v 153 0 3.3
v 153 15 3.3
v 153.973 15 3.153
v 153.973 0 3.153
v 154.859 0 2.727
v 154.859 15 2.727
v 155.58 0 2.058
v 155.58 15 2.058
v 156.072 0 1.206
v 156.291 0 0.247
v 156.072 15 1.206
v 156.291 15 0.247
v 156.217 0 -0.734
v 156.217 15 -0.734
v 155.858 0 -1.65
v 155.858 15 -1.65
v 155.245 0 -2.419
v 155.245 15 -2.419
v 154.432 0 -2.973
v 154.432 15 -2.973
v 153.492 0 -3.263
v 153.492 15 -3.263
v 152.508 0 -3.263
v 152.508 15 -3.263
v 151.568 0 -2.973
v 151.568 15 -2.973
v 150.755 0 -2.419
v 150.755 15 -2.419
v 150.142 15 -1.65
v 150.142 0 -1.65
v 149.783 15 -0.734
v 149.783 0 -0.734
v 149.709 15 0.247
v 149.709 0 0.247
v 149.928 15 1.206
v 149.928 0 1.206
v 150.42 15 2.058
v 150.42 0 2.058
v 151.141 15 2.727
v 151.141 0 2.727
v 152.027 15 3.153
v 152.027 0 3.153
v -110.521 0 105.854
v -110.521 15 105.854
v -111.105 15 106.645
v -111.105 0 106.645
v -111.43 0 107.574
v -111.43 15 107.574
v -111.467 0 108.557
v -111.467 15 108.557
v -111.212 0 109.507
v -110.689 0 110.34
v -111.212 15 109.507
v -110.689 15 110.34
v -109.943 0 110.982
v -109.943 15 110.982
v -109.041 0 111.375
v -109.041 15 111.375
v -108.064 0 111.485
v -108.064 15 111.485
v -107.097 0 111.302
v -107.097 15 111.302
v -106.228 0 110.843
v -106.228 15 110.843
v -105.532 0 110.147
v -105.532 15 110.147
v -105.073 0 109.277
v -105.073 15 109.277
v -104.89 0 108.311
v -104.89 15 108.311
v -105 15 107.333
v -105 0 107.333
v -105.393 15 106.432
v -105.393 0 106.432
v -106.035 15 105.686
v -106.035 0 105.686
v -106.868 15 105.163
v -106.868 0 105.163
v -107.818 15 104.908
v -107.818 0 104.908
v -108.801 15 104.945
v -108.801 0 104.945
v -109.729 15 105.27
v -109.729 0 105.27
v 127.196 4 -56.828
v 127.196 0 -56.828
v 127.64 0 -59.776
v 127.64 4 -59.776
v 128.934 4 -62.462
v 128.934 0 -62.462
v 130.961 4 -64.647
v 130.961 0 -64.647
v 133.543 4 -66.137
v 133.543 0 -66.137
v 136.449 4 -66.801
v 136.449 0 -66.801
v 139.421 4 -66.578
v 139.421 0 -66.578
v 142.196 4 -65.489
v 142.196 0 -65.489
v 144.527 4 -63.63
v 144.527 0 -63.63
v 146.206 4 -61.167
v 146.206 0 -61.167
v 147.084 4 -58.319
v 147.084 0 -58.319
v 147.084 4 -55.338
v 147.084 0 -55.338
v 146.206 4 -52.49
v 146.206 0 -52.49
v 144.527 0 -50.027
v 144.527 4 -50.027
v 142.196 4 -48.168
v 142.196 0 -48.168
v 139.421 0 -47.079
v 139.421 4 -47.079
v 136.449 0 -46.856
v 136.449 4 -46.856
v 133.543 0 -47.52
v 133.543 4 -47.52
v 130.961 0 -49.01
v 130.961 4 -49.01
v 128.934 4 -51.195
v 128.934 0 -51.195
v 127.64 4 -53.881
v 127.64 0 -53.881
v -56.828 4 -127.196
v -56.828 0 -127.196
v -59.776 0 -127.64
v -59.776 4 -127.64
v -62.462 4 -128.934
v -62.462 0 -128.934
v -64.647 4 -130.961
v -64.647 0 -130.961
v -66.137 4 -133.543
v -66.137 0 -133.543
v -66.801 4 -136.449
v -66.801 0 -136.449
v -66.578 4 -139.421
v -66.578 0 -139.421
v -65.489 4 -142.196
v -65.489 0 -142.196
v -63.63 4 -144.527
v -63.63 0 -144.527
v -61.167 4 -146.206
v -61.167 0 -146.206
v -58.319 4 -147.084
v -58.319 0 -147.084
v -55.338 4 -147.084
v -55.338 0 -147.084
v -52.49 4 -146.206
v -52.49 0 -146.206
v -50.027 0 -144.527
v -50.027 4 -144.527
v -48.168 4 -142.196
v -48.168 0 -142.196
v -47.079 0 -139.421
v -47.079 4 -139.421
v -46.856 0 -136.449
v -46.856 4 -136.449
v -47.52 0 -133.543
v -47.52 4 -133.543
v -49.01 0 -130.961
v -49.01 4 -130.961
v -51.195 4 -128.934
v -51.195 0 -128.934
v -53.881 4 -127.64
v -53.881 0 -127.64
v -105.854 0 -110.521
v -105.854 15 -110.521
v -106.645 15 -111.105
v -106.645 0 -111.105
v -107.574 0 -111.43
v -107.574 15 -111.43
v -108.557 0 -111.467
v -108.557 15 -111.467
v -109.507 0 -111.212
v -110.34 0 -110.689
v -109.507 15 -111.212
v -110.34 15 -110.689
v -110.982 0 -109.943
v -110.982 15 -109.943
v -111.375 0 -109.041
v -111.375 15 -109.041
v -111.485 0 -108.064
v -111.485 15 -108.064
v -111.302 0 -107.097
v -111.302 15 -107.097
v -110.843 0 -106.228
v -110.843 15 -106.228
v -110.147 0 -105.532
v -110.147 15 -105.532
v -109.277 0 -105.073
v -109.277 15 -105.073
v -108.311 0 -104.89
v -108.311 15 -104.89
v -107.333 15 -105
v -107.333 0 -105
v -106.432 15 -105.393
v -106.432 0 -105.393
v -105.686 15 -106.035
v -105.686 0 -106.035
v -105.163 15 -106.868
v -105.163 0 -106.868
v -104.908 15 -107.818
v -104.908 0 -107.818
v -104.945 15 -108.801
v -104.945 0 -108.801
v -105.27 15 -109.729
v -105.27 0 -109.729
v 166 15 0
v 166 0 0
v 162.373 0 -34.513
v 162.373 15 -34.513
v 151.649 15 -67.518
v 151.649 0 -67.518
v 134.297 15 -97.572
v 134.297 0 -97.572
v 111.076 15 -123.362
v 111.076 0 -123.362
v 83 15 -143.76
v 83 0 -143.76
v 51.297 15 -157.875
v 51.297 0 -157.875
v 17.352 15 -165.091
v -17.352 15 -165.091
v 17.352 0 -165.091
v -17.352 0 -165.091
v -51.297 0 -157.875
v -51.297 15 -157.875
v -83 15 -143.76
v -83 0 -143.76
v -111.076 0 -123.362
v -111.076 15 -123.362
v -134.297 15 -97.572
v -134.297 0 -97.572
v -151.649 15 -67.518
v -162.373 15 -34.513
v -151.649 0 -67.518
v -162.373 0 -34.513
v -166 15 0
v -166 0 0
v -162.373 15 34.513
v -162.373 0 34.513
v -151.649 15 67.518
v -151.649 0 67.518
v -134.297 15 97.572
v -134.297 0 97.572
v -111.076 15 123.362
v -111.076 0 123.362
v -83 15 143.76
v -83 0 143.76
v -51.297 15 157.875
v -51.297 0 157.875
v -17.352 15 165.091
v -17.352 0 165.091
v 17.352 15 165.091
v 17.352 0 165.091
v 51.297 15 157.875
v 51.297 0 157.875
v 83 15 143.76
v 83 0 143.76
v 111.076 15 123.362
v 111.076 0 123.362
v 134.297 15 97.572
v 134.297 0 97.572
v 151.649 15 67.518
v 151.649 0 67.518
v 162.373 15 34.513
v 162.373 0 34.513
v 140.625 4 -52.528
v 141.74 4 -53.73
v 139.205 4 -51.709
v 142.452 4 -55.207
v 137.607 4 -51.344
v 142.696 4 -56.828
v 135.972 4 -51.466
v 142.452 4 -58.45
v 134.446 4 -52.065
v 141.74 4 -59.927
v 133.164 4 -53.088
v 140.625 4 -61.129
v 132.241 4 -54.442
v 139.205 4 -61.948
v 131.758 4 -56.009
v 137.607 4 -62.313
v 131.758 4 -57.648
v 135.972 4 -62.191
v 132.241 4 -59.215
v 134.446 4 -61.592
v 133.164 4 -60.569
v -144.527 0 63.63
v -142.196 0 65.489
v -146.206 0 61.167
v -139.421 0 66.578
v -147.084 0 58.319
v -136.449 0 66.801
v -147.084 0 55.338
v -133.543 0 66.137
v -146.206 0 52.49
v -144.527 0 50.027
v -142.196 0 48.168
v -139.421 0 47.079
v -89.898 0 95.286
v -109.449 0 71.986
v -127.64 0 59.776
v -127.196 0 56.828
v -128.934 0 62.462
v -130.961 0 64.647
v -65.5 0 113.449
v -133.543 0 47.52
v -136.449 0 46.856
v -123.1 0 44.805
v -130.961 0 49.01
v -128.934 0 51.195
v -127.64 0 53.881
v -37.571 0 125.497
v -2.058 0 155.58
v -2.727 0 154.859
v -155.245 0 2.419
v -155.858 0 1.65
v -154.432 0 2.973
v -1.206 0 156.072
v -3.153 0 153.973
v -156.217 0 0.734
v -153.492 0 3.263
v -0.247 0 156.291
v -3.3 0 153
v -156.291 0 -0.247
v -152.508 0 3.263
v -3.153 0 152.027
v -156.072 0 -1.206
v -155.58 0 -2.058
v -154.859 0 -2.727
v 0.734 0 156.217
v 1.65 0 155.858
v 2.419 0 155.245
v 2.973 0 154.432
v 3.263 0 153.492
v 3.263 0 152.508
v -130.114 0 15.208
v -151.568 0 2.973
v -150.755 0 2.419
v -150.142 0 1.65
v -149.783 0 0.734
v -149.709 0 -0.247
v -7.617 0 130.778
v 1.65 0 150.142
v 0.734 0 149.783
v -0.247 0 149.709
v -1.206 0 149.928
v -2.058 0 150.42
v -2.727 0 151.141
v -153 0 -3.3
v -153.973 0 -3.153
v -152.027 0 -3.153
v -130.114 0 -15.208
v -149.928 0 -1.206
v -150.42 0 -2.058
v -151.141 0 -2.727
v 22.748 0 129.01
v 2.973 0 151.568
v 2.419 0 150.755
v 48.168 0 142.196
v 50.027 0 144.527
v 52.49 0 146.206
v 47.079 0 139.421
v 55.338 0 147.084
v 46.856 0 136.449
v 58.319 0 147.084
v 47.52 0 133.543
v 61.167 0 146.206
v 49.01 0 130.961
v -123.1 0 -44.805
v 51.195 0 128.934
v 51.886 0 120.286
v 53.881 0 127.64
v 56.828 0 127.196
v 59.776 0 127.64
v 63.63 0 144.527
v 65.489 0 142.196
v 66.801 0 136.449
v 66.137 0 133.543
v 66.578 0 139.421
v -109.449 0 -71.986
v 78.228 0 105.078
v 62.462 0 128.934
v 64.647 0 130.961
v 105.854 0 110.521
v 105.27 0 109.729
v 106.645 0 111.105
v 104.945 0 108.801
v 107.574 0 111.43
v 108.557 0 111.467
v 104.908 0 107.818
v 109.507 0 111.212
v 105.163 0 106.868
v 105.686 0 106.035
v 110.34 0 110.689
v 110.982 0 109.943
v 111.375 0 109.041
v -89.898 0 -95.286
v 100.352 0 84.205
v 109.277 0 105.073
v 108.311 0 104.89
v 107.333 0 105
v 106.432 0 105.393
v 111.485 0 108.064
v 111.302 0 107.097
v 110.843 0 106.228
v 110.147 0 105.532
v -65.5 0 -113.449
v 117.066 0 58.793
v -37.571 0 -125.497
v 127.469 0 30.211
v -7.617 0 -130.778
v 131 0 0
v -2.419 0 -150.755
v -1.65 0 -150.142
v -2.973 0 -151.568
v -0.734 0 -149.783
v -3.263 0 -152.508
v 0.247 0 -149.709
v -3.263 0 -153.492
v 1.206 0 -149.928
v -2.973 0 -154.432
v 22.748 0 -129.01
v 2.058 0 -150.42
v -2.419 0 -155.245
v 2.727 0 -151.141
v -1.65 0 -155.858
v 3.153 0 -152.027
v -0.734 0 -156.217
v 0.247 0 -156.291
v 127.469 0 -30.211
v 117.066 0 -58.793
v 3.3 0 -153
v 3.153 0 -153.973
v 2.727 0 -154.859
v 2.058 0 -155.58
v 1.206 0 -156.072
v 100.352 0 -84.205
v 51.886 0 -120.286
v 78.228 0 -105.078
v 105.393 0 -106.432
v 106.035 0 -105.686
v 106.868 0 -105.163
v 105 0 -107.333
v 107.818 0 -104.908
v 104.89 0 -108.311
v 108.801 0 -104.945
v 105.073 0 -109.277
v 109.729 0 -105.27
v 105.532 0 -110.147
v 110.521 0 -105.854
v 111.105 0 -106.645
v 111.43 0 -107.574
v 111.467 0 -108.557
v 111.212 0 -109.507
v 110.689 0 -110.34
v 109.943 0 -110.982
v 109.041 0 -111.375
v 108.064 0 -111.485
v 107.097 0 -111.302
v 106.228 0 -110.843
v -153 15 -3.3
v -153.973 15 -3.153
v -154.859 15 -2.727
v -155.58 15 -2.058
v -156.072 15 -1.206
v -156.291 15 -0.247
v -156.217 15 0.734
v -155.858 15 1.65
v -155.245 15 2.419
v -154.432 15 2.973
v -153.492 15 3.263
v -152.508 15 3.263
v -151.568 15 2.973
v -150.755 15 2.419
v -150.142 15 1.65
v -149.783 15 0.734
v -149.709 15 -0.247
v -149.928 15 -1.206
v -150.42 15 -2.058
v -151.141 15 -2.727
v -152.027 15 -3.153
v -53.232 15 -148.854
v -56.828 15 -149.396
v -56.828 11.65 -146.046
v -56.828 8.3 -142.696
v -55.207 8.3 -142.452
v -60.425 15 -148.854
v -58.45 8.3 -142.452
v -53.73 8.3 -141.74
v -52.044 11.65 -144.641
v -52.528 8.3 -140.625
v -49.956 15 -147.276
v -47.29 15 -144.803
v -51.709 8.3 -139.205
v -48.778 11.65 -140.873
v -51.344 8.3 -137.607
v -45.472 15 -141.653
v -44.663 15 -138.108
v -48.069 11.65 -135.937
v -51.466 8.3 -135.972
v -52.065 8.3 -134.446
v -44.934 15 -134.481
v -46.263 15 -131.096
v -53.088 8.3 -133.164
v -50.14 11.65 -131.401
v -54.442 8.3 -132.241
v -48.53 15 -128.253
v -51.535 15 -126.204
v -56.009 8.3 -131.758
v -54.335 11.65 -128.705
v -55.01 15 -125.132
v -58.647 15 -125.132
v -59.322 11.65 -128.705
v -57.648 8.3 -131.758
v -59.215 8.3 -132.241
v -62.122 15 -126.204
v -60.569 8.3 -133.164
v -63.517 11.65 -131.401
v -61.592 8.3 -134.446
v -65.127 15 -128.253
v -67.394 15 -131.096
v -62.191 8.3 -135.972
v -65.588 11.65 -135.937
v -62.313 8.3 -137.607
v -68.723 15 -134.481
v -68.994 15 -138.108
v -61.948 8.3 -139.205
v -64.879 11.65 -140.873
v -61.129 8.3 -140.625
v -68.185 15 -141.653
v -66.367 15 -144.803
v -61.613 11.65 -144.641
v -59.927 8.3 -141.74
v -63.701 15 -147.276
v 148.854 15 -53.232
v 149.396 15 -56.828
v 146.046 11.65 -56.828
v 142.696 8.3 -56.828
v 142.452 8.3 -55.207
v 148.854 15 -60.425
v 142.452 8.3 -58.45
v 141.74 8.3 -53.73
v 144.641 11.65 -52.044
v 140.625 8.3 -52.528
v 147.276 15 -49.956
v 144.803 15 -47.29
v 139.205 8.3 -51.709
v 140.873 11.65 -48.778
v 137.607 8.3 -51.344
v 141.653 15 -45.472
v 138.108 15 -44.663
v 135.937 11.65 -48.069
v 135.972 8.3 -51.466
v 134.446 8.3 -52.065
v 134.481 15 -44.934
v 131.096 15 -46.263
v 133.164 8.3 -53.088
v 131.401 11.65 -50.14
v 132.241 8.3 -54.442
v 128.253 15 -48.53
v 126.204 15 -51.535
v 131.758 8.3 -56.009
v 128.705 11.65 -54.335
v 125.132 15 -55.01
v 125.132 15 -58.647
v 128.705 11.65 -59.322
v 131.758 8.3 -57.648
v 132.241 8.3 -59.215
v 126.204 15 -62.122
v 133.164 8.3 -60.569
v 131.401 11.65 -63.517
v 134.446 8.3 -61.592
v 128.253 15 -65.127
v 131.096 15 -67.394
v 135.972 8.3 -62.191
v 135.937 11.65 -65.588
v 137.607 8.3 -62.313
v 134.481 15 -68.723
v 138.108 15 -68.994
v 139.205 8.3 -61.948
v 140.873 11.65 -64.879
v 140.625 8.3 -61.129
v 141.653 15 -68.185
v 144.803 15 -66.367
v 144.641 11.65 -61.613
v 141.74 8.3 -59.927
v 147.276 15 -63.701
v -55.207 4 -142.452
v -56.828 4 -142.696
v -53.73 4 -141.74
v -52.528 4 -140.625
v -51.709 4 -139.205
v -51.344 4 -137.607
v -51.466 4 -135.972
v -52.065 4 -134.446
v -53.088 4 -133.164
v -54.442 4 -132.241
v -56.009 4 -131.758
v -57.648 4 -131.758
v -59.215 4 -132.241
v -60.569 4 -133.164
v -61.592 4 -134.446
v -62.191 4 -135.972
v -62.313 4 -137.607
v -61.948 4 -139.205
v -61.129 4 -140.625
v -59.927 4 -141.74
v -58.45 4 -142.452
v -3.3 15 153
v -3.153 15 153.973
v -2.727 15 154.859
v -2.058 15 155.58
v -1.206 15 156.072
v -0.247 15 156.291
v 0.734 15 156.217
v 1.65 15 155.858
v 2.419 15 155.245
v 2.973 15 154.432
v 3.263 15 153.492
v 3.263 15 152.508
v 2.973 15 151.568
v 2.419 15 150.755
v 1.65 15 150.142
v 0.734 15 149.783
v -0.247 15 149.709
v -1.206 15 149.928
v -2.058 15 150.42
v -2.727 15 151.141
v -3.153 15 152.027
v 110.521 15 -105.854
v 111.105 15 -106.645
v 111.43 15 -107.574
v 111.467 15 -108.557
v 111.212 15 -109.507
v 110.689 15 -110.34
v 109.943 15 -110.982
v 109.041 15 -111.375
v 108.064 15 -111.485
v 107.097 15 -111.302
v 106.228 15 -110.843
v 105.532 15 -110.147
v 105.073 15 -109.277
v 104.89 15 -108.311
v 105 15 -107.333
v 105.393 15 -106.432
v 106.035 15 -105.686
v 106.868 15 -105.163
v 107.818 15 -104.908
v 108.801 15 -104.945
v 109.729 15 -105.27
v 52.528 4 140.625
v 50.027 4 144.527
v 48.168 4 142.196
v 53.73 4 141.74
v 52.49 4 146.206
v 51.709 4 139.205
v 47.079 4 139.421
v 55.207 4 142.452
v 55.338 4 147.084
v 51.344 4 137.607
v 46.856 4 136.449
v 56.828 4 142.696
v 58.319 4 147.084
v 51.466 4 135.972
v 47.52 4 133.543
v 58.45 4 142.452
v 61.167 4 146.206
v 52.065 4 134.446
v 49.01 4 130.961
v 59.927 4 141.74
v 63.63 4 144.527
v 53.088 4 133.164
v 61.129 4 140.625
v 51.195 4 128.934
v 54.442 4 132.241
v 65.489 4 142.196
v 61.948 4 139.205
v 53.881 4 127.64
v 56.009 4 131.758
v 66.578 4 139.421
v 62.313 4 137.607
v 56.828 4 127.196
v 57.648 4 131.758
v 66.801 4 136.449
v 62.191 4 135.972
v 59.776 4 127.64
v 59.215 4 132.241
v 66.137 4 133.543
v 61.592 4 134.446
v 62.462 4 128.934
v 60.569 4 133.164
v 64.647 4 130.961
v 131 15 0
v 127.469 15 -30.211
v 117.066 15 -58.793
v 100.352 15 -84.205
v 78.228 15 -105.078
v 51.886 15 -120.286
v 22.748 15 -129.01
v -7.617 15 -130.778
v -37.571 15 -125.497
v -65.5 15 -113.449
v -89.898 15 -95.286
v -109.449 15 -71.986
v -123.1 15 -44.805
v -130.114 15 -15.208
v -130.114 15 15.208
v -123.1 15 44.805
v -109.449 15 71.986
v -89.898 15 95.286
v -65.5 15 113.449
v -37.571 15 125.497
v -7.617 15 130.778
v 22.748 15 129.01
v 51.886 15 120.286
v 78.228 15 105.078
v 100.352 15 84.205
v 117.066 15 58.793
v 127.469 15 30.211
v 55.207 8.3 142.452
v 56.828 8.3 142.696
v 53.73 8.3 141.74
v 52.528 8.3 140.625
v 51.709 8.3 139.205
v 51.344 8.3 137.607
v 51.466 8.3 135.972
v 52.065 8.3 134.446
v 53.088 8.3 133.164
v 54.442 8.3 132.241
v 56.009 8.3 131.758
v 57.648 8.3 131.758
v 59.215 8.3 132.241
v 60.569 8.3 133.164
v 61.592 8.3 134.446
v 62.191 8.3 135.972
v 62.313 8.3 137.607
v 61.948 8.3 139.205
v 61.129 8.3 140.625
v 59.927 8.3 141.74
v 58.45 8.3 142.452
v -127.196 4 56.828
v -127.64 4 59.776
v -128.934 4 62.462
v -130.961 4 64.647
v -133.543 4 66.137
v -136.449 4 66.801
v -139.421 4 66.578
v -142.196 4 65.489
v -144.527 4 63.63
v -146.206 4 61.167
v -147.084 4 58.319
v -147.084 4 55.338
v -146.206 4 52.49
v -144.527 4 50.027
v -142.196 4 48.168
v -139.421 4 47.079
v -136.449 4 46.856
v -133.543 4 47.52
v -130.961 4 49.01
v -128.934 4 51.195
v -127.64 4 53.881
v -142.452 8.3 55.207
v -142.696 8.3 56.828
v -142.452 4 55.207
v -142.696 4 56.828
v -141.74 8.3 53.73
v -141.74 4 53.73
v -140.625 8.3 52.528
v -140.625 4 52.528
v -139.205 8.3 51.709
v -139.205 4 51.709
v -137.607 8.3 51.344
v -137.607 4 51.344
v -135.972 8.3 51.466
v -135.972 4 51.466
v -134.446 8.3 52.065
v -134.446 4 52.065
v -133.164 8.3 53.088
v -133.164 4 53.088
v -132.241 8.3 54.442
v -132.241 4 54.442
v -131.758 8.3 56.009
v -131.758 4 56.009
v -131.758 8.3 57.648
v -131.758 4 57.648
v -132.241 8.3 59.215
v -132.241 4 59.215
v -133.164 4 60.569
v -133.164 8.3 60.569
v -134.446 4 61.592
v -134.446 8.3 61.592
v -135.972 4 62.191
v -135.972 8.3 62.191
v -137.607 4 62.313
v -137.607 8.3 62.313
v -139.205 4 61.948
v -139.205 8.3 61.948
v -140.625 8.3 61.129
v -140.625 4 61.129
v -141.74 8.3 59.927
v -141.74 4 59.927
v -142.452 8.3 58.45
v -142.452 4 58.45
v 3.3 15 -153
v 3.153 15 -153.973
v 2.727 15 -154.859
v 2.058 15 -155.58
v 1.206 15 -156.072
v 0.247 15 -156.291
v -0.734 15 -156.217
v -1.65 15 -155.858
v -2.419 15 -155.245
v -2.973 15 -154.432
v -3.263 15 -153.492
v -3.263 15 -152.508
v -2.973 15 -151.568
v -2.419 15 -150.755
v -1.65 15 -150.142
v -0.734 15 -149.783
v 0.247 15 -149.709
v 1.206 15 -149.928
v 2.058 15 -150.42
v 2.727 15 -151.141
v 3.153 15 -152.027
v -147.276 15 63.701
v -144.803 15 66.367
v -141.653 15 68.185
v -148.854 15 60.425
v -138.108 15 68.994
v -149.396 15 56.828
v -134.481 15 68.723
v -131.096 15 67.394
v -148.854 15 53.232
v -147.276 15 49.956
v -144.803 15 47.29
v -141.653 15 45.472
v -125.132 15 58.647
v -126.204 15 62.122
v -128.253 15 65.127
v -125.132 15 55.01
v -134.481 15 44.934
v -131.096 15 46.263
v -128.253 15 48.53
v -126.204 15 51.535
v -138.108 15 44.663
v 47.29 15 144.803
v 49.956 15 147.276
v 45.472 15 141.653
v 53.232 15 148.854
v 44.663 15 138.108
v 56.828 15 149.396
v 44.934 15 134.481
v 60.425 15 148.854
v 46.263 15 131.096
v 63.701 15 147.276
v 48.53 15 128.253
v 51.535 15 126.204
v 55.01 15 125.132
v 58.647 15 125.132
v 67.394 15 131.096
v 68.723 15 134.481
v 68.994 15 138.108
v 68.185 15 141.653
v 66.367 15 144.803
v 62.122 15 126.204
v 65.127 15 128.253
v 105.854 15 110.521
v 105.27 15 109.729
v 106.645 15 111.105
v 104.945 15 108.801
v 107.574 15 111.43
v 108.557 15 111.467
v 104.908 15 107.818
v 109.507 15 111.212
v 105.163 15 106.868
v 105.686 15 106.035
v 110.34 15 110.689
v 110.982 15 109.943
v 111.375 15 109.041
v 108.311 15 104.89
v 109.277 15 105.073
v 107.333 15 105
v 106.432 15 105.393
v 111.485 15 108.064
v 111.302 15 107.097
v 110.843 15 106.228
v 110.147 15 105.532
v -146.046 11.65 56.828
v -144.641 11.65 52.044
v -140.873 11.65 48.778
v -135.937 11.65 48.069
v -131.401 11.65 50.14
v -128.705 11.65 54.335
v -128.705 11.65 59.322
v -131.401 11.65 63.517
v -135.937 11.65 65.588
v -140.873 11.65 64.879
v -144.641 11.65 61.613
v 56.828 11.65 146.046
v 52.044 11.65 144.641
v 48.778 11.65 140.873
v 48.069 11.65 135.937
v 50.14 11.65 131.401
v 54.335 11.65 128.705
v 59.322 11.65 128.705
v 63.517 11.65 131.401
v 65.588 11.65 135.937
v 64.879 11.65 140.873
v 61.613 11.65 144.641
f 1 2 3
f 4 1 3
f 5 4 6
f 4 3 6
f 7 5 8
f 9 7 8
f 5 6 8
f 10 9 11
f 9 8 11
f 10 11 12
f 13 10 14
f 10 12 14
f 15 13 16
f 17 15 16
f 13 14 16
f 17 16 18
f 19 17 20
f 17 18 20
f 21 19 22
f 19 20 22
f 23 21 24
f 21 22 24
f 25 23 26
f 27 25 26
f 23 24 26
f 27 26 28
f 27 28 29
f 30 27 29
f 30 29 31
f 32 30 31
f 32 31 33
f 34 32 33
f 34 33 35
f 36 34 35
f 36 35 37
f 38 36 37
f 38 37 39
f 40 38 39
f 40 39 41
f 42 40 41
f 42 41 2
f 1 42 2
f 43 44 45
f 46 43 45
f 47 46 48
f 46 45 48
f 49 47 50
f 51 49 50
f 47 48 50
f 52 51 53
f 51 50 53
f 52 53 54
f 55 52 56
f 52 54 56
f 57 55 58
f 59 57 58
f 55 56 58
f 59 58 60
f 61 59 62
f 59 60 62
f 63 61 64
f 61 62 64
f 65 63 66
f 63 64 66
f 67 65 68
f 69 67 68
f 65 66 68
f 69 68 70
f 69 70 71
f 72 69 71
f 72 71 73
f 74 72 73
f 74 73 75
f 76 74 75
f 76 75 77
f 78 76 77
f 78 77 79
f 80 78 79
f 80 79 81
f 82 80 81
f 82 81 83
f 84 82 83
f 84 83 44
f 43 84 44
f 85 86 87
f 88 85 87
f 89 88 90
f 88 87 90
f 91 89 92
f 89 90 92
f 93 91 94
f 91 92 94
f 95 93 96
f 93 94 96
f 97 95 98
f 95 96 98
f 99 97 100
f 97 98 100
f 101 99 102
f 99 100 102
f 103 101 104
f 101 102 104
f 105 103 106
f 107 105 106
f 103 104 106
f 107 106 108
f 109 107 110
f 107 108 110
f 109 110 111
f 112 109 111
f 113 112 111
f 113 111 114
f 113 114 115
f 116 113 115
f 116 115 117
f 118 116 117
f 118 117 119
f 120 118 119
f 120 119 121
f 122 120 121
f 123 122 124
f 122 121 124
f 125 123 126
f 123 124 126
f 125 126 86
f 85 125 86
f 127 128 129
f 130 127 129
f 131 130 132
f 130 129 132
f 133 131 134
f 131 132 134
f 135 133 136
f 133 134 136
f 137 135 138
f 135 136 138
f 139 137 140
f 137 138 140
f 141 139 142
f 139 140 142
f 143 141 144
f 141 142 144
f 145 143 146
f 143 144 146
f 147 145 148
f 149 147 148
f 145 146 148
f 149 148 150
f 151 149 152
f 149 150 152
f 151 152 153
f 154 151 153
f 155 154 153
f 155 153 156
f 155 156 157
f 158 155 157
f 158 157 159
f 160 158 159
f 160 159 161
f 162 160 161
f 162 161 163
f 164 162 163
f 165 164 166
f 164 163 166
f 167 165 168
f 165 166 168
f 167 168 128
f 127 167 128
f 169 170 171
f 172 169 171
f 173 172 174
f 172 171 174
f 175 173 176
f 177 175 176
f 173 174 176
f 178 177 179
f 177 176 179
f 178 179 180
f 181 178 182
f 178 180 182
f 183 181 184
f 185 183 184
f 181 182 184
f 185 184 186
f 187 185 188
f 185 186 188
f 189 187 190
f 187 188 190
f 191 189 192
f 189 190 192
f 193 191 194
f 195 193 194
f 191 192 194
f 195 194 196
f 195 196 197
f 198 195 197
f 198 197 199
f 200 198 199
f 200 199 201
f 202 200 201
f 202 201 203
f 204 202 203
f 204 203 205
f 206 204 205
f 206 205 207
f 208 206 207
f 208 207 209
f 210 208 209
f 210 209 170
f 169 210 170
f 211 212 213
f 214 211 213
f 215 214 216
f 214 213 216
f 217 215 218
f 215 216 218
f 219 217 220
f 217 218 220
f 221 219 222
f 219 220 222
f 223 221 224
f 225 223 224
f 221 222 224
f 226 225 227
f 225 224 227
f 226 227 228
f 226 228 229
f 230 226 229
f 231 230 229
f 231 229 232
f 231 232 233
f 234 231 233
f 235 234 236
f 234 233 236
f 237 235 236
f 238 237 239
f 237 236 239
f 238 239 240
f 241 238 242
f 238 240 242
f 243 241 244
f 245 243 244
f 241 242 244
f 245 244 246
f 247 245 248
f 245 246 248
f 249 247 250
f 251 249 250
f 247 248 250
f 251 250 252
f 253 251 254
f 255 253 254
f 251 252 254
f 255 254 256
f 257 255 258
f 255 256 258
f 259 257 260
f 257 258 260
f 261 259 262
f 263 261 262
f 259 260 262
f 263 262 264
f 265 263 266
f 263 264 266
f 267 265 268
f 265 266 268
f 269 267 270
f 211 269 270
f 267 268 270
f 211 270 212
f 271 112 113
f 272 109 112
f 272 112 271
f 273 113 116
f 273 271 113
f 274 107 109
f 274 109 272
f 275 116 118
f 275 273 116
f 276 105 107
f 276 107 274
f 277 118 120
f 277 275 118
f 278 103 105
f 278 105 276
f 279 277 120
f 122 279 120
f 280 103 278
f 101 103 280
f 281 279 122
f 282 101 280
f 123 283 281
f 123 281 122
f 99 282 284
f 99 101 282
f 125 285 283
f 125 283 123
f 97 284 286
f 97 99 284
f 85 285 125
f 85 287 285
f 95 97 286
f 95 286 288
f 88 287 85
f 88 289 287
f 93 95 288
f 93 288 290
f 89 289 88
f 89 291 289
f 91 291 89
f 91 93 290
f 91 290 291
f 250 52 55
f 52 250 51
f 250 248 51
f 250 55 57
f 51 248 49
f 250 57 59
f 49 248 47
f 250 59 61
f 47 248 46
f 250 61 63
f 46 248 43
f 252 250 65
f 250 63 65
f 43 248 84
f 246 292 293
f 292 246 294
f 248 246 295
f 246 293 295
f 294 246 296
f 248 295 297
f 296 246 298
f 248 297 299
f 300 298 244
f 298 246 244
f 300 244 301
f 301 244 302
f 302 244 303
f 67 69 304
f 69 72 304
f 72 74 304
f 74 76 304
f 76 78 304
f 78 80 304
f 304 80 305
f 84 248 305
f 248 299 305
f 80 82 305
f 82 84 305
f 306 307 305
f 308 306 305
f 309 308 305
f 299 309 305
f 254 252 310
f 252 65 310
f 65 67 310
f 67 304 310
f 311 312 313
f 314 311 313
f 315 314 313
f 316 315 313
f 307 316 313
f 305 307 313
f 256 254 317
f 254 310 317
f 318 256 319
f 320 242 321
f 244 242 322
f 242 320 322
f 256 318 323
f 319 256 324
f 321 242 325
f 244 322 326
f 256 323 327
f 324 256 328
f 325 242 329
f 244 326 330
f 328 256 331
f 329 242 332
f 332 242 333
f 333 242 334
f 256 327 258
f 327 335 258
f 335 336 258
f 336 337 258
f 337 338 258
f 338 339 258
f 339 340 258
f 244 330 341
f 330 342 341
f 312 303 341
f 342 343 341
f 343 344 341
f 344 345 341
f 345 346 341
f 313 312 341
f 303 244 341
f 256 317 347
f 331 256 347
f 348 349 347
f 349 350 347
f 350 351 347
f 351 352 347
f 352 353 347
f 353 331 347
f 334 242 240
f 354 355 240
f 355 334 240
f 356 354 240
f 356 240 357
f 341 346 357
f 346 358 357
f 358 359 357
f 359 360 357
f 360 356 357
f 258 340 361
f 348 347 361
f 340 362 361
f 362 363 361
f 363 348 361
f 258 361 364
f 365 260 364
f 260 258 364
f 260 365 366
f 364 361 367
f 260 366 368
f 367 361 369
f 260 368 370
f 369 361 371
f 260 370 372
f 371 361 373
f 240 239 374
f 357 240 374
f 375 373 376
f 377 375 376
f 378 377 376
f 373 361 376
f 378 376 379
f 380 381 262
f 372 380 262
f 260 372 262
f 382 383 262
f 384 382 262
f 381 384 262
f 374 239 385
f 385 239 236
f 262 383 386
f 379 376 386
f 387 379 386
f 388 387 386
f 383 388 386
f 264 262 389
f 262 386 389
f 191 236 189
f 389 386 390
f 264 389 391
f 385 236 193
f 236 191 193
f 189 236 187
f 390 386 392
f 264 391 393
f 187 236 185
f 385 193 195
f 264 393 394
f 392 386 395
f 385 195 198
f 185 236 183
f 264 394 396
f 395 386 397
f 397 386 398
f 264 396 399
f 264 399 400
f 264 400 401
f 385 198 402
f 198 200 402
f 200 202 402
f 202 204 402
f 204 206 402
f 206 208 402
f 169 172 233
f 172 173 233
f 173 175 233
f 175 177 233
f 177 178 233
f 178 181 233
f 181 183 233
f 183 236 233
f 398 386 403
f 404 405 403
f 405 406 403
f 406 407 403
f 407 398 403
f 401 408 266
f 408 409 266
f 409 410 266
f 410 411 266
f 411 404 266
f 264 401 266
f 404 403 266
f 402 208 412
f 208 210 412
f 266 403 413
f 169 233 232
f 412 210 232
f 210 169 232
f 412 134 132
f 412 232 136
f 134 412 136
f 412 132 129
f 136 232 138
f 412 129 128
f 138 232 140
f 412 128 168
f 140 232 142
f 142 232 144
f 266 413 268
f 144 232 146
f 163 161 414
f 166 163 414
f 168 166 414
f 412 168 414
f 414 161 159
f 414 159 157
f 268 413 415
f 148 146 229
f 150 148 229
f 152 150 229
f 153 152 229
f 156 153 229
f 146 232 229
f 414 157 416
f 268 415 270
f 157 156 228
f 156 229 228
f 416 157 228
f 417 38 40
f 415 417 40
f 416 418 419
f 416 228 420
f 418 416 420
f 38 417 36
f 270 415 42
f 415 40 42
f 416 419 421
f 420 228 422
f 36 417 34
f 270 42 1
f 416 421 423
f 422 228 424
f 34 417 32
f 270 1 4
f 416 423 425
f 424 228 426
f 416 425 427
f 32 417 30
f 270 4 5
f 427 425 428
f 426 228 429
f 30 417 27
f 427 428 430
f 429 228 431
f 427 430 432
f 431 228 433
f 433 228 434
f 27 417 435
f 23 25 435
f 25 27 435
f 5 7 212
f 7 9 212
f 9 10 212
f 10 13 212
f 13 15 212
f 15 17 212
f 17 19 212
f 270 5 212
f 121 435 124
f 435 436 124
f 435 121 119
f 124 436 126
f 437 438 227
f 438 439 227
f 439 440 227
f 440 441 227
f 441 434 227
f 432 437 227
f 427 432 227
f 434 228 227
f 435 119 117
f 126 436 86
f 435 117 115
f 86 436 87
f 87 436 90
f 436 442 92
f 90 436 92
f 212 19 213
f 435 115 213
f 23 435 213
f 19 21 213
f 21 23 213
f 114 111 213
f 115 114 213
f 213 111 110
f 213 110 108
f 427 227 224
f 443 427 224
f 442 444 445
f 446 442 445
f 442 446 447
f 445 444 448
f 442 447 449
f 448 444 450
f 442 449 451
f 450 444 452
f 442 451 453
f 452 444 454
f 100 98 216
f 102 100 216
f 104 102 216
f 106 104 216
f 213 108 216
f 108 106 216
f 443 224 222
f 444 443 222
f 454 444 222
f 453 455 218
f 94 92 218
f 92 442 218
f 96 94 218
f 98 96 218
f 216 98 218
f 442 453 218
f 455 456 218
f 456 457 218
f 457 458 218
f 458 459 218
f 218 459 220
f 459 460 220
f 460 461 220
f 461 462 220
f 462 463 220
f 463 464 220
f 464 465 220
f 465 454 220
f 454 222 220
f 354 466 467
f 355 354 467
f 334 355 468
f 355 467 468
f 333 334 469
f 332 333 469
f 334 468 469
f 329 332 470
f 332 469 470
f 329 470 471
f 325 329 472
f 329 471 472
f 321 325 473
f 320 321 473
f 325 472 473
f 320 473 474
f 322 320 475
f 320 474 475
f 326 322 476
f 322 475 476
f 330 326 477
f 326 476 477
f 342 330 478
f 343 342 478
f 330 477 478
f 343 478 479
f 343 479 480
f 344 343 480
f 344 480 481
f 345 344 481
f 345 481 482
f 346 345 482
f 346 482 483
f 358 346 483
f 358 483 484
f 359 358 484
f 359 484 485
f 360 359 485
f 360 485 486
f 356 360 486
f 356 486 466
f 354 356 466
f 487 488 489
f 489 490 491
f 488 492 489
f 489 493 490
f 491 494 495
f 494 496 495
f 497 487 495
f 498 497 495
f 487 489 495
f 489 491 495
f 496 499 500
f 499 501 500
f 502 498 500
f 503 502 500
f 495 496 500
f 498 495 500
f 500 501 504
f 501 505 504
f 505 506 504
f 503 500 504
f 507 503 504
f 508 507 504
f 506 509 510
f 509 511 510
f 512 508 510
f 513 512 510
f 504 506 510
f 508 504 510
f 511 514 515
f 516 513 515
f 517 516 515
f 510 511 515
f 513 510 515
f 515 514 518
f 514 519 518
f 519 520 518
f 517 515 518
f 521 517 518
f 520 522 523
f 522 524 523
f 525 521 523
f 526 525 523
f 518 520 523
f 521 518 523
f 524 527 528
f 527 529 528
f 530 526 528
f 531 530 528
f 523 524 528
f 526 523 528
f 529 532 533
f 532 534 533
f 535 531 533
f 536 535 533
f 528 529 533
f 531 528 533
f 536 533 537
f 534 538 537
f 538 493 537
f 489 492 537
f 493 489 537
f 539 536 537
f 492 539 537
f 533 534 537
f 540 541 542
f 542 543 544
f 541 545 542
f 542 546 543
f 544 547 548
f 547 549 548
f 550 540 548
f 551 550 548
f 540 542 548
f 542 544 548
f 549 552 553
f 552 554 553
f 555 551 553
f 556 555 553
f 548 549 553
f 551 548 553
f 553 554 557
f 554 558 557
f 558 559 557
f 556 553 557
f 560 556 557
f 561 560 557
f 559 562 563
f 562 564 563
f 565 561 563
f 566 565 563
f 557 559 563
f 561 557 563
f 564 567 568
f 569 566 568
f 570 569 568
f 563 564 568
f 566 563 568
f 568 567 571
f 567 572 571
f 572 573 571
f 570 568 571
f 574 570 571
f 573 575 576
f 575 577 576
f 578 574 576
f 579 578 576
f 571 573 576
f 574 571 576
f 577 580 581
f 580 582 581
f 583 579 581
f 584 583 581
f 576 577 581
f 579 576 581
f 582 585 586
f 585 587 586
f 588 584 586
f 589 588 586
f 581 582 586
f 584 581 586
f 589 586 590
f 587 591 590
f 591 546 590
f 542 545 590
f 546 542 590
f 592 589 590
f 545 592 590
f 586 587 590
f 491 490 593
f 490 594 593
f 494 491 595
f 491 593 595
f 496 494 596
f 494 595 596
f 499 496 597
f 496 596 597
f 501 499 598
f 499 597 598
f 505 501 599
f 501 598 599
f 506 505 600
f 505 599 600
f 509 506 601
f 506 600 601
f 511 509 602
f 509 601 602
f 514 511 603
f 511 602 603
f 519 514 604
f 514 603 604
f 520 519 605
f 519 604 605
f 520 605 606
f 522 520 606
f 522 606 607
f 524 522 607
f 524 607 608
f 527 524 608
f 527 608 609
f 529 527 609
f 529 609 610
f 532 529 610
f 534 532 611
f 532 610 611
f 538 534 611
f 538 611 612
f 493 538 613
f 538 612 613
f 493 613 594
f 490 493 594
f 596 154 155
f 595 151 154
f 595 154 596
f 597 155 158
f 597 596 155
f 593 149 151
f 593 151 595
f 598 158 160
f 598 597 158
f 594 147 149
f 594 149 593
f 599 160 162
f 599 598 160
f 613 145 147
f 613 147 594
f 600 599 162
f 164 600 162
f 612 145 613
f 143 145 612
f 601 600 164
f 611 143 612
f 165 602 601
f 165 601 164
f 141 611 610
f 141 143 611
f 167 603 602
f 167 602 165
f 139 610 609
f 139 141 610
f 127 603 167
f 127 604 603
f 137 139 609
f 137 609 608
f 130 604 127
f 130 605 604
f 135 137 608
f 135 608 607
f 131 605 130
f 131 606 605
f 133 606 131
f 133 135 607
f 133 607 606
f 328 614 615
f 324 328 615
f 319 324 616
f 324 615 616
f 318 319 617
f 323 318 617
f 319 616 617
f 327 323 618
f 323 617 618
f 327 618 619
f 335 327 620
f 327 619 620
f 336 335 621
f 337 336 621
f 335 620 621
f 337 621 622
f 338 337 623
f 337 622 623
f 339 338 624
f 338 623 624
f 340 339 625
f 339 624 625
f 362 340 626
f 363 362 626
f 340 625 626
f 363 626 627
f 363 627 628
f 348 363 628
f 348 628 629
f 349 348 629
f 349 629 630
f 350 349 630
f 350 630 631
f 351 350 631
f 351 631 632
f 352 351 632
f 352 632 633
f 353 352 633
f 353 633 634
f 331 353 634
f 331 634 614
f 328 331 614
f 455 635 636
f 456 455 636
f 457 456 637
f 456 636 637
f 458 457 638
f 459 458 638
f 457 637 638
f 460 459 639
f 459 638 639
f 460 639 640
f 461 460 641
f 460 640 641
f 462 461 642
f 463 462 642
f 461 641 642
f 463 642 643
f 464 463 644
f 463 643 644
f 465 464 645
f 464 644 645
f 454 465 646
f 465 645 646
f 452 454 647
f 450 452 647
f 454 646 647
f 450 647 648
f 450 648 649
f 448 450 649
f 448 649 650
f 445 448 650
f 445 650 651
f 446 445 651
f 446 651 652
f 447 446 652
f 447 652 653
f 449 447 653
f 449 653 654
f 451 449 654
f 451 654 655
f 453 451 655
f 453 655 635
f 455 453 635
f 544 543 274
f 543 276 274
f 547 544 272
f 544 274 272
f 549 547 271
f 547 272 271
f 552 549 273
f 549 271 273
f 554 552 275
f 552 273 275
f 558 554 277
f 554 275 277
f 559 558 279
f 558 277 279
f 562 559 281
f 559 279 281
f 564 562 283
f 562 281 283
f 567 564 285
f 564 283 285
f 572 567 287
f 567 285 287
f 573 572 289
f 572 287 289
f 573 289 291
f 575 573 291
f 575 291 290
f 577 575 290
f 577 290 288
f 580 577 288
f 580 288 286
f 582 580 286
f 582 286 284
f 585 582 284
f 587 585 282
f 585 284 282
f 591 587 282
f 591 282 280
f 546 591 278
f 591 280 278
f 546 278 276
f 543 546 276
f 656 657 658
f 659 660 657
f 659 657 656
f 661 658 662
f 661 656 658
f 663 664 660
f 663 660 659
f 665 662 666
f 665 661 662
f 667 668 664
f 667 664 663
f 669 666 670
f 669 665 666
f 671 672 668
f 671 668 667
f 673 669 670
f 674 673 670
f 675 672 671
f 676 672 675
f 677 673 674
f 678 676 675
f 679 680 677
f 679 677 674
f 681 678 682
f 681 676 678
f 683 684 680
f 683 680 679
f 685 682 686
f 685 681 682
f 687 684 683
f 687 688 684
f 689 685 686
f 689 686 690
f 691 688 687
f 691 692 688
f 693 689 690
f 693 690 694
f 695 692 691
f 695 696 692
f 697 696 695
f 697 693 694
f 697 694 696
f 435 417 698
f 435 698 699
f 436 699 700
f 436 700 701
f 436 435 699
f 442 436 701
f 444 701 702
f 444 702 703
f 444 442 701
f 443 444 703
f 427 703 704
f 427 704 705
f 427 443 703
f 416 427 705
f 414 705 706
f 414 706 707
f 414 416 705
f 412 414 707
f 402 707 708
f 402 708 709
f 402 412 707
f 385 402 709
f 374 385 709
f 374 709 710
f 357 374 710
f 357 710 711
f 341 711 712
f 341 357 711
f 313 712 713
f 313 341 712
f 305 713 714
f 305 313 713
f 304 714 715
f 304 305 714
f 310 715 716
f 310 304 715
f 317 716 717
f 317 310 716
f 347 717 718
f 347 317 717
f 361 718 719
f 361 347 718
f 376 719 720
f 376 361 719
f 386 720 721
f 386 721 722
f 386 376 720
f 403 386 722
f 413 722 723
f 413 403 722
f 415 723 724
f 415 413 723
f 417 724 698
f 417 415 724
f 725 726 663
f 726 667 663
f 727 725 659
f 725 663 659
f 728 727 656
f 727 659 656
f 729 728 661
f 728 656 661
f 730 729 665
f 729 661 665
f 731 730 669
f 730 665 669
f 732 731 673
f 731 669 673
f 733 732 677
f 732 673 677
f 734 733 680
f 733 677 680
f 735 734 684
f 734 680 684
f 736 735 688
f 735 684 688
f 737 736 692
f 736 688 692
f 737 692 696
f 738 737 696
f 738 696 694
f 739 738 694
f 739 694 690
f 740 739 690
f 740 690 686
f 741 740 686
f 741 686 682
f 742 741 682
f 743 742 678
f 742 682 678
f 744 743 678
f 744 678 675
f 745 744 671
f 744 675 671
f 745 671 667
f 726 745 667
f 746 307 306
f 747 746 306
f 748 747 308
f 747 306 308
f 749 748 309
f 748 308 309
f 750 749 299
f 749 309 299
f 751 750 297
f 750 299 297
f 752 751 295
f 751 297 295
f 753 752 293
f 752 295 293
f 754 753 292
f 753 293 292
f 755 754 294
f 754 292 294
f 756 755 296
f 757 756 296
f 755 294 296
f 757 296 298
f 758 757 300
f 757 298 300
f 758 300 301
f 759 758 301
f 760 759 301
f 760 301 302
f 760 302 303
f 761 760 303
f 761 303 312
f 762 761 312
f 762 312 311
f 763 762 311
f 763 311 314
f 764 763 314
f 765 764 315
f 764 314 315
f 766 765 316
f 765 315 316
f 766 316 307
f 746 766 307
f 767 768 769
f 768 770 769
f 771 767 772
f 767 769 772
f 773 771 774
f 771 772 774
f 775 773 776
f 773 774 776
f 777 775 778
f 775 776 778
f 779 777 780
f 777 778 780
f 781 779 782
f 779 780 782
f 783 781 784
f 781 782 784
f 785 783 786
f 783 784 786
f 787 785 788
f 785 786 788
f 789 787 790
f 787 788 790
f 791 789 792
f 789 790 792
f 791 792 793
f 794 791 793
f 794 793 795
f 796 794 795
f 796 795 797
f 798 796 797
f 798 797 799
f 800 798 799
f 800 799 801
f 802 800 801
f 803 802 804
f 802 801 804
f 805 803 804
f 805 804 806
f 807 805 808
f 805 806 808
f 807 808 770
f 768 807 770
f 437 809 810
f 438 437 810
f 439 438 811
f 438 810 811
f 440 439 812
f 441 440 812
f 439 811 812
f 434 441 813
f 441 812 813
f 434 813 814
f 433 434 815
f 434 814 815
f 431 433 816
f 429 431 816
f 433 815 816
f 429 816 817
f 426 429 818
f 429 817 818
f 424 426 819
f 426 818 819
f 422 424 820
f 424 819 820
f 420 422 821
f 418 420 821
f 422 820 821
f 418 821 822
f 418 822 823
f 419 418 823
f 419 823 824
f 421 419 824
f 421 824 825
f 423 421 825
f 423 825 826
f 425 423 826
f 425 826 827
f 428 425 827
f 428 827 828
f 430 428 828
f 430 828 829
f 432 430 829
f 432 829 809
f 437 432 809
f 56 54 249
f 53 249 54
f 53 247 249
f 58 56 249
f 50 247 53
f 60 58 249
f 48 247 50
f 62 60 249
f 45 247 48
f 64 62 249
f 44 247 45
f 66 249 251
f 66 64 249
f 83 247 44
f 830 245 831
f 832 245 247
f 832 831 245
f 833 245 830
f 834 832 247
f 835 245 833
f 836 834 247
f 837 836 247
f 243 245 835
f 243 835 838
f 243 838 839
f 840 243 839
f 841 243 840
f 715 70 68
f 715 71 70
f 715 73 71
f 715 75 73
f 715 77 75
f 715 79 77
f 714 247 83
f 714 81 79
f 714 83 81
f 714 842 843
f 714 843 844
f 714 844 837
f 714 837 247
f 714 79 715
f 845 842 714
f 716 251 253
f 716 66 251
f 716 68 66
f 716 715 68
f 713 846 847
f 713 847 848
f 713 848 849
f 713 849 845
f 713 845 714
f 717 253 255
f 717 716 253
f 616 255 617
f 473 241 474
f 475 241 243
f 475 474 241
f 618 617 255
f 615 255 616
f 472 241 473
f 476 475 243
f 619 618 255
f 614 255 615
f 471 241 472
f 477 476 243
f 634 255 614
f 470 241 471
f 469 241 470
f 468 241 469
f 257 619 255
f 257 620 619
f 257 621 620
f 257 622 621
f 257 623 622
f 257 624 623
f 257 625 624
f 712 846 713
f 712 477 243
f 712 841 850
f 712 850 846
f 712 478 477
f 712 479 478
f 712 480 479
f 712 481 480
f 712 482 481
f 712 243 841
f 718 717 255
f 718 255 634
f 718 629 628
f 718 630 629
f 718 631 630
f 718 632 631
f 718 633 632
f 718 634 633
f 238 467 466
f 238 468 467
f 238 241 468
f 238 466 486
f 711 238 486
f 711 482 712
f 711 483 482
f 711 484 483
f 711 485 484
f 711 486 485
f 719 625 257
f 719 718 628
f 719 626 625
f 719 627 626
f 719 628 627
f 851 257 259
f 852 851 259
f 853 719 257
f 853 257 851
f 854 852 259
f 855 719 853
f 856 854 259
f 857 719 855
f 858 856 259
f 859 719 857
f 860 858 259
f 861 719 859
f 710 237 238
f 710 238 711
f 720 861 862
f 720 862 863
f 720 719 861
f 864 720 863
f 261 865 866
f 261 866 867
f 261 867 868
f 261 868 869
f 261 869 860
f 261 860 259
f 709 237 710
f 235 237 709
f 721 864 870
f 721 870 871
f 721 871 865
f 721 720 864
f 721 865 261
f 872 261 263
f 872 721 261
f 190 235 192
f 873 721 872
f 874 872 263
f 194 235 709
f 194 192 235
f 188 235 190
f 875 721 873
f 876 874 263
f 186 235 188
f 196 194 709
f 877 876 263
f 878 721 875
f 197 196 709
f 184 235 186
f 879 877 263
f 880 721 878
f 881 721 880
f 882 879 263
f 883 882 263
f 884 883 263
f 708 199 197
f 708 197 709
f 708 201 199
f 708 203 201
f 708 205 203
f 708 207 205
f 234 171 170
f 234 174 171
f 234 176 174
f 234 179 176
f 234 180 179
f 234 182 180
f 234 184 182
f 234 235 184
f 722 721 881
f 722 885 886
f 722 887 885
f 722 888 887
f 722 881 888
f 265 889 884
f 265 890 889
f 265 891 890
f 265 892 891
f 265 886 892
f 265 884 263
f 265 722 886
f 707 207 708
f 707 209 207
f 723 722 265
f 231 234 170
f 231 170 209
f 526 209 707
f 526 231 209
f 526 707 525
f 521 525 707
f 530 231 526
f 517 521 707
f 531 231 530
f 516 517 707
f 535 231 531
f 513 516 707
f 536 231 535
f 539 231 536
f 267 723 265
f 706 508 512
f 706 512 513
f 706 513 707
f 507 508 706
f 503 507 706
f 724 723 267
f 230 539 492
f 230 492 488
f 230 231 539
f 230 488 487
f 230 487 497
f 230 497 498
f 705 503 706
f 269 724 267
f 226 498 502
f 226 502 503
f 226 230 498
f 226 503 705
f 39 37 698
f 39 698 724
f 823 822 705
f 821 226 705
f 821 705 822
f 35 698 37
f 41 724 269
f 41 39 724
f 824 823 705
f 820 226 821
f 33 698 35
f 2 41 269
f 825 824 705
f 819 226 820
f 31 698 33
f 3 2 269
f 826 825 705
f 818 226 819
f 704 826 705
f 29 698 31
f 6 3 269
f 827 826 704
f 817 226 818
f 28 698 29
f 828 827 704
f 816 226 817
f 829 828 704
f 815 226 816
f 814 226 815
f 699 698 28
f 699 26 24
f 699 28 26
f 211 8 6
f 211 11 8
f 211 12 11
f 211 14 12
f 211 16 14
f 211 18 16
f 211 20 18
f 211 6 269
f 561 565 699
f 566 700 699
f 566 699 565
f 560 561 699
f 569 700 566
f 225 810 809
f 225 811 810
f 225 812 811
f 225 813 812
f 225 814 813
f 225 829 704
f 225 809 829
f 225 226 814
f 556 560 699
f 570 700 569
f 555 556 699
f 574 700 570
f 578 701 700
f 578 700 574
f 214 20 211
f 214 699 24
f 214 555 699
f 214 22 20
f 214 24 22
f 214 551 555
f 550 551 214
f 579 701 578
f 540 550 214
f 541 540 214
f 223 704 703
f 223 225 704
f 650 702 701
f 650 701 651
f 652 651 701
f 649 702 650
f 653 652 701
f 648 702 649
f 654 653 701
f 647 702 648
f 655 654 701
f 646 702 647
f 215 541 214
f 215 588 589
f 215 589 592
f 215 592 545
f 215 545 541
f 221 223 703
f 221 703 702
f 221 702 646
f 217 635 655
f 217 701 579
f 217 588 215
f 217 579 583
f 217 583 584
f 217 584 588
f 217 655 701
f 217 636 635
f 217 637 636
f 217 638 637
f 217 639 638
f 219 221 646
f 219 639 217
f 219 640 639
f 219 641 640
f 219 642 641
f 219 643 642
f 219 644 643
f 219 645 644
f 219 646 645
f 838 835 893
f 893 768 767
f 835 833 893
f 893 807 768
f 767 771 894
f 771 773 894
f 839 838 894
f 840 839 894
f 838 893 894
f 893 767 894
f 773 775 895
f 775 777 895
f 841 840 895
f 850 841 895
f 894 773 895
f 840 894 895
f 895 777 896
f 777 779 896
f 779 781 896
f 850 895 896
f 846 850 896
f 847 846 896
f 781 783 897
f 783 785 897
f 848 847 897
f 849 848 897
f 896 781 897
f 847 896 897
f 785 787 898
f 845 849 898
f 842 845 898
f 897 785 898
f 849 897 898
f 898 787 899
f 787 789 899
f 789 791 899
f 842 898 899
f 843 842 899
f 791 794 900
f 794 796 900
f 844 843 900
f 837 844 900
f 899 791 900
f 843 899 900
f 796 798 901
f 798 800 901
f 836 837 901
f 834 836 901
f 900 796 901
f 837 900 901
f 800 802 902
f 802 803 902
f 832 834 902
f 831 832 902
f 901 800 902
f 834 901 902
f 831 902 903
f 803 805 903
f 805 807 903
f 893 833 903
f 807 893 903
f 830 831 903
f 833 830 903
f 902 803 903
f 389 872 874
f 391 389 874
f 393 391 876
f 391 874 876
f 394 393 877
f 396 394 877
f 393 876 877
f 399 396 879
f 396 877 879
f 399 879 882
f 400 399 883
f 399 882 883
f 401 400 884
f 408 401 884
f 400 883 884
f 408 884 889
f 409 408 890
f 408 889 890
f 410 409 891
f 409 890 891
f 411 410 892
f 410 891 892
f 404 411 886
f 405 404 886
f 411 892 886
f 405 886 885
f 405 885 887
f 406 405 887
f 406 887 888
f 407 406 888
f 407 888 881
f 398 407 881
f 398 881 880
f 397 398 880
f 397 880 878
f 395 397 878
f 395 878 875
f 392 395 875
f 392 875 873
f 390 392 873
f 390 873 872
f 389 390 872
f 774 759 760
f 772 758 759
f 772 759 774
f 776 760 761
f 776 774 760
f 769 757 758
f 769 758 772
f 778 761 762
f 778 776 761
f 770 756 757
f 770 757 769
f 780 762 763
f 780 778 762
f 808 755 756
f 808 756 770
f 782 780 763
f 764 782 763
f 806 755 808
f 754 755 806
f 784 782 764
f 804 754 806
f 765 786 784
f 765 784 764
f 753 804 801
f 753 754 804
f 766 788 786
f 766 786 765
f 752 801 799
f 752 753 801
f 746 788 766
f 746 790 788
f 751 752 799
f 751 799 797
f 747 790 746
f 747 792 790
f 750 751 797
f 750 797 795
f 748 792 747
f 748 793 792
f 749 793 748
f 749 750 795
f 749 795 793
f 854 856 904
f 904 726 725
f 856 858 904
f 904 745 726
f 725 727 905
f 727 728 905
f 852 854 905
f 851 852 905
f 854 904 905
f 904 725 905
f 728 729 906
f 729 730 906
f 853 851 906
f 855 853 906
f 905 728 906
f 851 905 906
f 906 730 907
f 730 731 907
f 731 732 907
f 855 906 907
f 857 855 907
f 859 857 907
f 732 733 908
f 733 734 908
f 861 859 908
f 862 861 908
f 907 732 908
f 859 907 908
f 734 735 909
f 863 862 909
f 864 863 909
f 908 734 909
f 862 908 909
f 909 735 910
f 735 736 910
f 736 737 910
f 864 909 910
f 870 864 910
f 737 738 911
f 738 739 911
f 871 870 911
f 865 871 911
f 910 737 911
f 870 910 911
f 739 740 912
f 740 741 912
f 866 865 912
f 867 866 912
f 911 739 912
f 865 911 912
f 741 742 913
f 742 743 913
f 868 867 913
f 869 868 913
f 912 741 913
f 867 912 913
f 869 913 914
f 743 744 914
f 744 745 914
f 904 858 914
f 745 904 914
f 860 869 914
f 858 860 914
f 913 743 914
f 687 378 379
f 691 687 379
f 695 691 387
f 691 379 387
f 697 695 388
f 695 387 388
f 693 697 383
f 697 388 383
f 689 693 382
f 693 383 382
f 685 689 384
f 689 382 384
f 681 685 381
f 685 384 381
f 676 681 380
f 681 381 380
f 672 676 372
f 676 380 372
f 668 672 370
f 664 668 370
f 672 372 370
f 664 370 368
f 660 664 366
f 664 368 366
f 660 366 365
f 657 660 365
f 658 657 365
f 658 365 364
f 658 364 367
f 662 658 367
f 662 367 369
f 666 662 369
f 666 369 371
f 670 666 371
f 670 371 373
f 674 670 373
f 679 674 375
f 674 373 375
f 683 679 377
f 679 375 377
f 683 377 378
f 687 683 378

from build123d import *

# Parameters (mm, degrees)
SKETCH1_R                                            = 166
SKETCH1_R_2                                          = 131
BOSS_EXTRUDE1_DEPTH                                  = 15
M6_CLEARANCE_HOLE1_D                                 = 6.6
CIRPATTERN1_COUNT                                    = 8
SKETCH4_R                                            = 10
CUT_EXTRUDE1_DEPTH                                   = 4
CSK_FOR_M10_HEX_SOCKET_COUNTERSUNK_CAP_S_D           = 11
CSK_FOR_M10_HEX_SOCKET_COUNTERSUNK_CAP_S_CSINK_D     = 24.4
CSK_FOR_M10_HEX_SOCKET_COUNTERSUNK_CAP_S_CSINK_ANGLE = 90
CIRPATTERN2_COUNT                                    = 4


with BuildPart() as part:
    # Sketch1 → Boss-Extrude1 (new body)
    with BuildSketch(Plane(origin=(0, 0, 0), x_dir=(1, 0, 0), z_dir=(0, 1, 0))):
        Circle(SKETCH1_R)
        Circle(SKETCH1_R_2, mode=Mode.SUBTRACT)
    extrude(amount=BOSS_EXTRUDE1_DEPTH)

    # M6 Clearance Hole1 (through all)
    with Locations(Plane(origin=(0, 0, 0), x_dir=(-1, 0, 0), z_dir=(0, -1, 0))):
        with Locations((0, 153)):
            m6_clearance_hole1 = Hole(M6_CLEARANCE_HOLE1_D / 2)

    # CirPattern1: M6 Clearance Hole1 ×8 about axis
    cirpattern1_axis = Axis((0, 0, 0), (0, 1, 0))
    for i in range(1, CIRPATTERN1_COUNT):
        add(m6_clearance_hole1.rotate(cirpattern1_axis, i * 360 / CIRPATTERN1_COUNT), mode=Mode.SUBTRACT)

    # Sketch4 → Cut-Extrude1 (cut)
    with BuildSketch(Plane.XZ):
        with Locations((-137.196110578, 56.828489706)):
            Circle(SKETCH4_R)
    cut_extrude1 = extrude(amount=-CUT_EXTRUDE1_DEPTH, mode=Mode.SUBTRACT)

    # CSK for M10 Hex Socket Countersunk Cap Screw1 (through all)
    with Locations(Plane(origin=(0, 15, 0), x_dir=(1, 0, 0), z_dir=(0, 1, 0))):
        with Locations((-137.196110578, -56.828489706)):
            csk_for_m10_hex_socket_countersunk_cap_s = CounterSinkHole(CSK_FOR_M10_HEX_SOCKET_COUNTERSUNK_CAP_S_D / 2, CSK_FOR_M10_HEX_SOCKET_COUNTERSUNK_CAP_S_CSINK_D / 2, counter_sink_angle=CSK_FOR_M10_HEX_SOCKET_COUNTERSUNK_CAP_S_CSINK_ANGLE)

    # CirPattern2: Cut-Extrude1, CSK for M10 Hex Socket Countersunk Cap Screw1 ×4 about axis
    cirpattern2_axis = Axis((0, 0, 0), (0, 1, 0))
    for i in range(1, CIRPATTERN2_COUNT):
        add(cut_extrude1.rotate(cirpattern2_axis, i * 360 / CIRPATTERN2_COUNT), mode=Mode.SUBTRACT)
        add(csk_for_m10_hex_socket_countersunk_cap_s.rotate(cirpattern2_axis, i * 360 / CIRPATTERN2_COUNT), mode=Mode.SUBTRACT)


solid = part.part
